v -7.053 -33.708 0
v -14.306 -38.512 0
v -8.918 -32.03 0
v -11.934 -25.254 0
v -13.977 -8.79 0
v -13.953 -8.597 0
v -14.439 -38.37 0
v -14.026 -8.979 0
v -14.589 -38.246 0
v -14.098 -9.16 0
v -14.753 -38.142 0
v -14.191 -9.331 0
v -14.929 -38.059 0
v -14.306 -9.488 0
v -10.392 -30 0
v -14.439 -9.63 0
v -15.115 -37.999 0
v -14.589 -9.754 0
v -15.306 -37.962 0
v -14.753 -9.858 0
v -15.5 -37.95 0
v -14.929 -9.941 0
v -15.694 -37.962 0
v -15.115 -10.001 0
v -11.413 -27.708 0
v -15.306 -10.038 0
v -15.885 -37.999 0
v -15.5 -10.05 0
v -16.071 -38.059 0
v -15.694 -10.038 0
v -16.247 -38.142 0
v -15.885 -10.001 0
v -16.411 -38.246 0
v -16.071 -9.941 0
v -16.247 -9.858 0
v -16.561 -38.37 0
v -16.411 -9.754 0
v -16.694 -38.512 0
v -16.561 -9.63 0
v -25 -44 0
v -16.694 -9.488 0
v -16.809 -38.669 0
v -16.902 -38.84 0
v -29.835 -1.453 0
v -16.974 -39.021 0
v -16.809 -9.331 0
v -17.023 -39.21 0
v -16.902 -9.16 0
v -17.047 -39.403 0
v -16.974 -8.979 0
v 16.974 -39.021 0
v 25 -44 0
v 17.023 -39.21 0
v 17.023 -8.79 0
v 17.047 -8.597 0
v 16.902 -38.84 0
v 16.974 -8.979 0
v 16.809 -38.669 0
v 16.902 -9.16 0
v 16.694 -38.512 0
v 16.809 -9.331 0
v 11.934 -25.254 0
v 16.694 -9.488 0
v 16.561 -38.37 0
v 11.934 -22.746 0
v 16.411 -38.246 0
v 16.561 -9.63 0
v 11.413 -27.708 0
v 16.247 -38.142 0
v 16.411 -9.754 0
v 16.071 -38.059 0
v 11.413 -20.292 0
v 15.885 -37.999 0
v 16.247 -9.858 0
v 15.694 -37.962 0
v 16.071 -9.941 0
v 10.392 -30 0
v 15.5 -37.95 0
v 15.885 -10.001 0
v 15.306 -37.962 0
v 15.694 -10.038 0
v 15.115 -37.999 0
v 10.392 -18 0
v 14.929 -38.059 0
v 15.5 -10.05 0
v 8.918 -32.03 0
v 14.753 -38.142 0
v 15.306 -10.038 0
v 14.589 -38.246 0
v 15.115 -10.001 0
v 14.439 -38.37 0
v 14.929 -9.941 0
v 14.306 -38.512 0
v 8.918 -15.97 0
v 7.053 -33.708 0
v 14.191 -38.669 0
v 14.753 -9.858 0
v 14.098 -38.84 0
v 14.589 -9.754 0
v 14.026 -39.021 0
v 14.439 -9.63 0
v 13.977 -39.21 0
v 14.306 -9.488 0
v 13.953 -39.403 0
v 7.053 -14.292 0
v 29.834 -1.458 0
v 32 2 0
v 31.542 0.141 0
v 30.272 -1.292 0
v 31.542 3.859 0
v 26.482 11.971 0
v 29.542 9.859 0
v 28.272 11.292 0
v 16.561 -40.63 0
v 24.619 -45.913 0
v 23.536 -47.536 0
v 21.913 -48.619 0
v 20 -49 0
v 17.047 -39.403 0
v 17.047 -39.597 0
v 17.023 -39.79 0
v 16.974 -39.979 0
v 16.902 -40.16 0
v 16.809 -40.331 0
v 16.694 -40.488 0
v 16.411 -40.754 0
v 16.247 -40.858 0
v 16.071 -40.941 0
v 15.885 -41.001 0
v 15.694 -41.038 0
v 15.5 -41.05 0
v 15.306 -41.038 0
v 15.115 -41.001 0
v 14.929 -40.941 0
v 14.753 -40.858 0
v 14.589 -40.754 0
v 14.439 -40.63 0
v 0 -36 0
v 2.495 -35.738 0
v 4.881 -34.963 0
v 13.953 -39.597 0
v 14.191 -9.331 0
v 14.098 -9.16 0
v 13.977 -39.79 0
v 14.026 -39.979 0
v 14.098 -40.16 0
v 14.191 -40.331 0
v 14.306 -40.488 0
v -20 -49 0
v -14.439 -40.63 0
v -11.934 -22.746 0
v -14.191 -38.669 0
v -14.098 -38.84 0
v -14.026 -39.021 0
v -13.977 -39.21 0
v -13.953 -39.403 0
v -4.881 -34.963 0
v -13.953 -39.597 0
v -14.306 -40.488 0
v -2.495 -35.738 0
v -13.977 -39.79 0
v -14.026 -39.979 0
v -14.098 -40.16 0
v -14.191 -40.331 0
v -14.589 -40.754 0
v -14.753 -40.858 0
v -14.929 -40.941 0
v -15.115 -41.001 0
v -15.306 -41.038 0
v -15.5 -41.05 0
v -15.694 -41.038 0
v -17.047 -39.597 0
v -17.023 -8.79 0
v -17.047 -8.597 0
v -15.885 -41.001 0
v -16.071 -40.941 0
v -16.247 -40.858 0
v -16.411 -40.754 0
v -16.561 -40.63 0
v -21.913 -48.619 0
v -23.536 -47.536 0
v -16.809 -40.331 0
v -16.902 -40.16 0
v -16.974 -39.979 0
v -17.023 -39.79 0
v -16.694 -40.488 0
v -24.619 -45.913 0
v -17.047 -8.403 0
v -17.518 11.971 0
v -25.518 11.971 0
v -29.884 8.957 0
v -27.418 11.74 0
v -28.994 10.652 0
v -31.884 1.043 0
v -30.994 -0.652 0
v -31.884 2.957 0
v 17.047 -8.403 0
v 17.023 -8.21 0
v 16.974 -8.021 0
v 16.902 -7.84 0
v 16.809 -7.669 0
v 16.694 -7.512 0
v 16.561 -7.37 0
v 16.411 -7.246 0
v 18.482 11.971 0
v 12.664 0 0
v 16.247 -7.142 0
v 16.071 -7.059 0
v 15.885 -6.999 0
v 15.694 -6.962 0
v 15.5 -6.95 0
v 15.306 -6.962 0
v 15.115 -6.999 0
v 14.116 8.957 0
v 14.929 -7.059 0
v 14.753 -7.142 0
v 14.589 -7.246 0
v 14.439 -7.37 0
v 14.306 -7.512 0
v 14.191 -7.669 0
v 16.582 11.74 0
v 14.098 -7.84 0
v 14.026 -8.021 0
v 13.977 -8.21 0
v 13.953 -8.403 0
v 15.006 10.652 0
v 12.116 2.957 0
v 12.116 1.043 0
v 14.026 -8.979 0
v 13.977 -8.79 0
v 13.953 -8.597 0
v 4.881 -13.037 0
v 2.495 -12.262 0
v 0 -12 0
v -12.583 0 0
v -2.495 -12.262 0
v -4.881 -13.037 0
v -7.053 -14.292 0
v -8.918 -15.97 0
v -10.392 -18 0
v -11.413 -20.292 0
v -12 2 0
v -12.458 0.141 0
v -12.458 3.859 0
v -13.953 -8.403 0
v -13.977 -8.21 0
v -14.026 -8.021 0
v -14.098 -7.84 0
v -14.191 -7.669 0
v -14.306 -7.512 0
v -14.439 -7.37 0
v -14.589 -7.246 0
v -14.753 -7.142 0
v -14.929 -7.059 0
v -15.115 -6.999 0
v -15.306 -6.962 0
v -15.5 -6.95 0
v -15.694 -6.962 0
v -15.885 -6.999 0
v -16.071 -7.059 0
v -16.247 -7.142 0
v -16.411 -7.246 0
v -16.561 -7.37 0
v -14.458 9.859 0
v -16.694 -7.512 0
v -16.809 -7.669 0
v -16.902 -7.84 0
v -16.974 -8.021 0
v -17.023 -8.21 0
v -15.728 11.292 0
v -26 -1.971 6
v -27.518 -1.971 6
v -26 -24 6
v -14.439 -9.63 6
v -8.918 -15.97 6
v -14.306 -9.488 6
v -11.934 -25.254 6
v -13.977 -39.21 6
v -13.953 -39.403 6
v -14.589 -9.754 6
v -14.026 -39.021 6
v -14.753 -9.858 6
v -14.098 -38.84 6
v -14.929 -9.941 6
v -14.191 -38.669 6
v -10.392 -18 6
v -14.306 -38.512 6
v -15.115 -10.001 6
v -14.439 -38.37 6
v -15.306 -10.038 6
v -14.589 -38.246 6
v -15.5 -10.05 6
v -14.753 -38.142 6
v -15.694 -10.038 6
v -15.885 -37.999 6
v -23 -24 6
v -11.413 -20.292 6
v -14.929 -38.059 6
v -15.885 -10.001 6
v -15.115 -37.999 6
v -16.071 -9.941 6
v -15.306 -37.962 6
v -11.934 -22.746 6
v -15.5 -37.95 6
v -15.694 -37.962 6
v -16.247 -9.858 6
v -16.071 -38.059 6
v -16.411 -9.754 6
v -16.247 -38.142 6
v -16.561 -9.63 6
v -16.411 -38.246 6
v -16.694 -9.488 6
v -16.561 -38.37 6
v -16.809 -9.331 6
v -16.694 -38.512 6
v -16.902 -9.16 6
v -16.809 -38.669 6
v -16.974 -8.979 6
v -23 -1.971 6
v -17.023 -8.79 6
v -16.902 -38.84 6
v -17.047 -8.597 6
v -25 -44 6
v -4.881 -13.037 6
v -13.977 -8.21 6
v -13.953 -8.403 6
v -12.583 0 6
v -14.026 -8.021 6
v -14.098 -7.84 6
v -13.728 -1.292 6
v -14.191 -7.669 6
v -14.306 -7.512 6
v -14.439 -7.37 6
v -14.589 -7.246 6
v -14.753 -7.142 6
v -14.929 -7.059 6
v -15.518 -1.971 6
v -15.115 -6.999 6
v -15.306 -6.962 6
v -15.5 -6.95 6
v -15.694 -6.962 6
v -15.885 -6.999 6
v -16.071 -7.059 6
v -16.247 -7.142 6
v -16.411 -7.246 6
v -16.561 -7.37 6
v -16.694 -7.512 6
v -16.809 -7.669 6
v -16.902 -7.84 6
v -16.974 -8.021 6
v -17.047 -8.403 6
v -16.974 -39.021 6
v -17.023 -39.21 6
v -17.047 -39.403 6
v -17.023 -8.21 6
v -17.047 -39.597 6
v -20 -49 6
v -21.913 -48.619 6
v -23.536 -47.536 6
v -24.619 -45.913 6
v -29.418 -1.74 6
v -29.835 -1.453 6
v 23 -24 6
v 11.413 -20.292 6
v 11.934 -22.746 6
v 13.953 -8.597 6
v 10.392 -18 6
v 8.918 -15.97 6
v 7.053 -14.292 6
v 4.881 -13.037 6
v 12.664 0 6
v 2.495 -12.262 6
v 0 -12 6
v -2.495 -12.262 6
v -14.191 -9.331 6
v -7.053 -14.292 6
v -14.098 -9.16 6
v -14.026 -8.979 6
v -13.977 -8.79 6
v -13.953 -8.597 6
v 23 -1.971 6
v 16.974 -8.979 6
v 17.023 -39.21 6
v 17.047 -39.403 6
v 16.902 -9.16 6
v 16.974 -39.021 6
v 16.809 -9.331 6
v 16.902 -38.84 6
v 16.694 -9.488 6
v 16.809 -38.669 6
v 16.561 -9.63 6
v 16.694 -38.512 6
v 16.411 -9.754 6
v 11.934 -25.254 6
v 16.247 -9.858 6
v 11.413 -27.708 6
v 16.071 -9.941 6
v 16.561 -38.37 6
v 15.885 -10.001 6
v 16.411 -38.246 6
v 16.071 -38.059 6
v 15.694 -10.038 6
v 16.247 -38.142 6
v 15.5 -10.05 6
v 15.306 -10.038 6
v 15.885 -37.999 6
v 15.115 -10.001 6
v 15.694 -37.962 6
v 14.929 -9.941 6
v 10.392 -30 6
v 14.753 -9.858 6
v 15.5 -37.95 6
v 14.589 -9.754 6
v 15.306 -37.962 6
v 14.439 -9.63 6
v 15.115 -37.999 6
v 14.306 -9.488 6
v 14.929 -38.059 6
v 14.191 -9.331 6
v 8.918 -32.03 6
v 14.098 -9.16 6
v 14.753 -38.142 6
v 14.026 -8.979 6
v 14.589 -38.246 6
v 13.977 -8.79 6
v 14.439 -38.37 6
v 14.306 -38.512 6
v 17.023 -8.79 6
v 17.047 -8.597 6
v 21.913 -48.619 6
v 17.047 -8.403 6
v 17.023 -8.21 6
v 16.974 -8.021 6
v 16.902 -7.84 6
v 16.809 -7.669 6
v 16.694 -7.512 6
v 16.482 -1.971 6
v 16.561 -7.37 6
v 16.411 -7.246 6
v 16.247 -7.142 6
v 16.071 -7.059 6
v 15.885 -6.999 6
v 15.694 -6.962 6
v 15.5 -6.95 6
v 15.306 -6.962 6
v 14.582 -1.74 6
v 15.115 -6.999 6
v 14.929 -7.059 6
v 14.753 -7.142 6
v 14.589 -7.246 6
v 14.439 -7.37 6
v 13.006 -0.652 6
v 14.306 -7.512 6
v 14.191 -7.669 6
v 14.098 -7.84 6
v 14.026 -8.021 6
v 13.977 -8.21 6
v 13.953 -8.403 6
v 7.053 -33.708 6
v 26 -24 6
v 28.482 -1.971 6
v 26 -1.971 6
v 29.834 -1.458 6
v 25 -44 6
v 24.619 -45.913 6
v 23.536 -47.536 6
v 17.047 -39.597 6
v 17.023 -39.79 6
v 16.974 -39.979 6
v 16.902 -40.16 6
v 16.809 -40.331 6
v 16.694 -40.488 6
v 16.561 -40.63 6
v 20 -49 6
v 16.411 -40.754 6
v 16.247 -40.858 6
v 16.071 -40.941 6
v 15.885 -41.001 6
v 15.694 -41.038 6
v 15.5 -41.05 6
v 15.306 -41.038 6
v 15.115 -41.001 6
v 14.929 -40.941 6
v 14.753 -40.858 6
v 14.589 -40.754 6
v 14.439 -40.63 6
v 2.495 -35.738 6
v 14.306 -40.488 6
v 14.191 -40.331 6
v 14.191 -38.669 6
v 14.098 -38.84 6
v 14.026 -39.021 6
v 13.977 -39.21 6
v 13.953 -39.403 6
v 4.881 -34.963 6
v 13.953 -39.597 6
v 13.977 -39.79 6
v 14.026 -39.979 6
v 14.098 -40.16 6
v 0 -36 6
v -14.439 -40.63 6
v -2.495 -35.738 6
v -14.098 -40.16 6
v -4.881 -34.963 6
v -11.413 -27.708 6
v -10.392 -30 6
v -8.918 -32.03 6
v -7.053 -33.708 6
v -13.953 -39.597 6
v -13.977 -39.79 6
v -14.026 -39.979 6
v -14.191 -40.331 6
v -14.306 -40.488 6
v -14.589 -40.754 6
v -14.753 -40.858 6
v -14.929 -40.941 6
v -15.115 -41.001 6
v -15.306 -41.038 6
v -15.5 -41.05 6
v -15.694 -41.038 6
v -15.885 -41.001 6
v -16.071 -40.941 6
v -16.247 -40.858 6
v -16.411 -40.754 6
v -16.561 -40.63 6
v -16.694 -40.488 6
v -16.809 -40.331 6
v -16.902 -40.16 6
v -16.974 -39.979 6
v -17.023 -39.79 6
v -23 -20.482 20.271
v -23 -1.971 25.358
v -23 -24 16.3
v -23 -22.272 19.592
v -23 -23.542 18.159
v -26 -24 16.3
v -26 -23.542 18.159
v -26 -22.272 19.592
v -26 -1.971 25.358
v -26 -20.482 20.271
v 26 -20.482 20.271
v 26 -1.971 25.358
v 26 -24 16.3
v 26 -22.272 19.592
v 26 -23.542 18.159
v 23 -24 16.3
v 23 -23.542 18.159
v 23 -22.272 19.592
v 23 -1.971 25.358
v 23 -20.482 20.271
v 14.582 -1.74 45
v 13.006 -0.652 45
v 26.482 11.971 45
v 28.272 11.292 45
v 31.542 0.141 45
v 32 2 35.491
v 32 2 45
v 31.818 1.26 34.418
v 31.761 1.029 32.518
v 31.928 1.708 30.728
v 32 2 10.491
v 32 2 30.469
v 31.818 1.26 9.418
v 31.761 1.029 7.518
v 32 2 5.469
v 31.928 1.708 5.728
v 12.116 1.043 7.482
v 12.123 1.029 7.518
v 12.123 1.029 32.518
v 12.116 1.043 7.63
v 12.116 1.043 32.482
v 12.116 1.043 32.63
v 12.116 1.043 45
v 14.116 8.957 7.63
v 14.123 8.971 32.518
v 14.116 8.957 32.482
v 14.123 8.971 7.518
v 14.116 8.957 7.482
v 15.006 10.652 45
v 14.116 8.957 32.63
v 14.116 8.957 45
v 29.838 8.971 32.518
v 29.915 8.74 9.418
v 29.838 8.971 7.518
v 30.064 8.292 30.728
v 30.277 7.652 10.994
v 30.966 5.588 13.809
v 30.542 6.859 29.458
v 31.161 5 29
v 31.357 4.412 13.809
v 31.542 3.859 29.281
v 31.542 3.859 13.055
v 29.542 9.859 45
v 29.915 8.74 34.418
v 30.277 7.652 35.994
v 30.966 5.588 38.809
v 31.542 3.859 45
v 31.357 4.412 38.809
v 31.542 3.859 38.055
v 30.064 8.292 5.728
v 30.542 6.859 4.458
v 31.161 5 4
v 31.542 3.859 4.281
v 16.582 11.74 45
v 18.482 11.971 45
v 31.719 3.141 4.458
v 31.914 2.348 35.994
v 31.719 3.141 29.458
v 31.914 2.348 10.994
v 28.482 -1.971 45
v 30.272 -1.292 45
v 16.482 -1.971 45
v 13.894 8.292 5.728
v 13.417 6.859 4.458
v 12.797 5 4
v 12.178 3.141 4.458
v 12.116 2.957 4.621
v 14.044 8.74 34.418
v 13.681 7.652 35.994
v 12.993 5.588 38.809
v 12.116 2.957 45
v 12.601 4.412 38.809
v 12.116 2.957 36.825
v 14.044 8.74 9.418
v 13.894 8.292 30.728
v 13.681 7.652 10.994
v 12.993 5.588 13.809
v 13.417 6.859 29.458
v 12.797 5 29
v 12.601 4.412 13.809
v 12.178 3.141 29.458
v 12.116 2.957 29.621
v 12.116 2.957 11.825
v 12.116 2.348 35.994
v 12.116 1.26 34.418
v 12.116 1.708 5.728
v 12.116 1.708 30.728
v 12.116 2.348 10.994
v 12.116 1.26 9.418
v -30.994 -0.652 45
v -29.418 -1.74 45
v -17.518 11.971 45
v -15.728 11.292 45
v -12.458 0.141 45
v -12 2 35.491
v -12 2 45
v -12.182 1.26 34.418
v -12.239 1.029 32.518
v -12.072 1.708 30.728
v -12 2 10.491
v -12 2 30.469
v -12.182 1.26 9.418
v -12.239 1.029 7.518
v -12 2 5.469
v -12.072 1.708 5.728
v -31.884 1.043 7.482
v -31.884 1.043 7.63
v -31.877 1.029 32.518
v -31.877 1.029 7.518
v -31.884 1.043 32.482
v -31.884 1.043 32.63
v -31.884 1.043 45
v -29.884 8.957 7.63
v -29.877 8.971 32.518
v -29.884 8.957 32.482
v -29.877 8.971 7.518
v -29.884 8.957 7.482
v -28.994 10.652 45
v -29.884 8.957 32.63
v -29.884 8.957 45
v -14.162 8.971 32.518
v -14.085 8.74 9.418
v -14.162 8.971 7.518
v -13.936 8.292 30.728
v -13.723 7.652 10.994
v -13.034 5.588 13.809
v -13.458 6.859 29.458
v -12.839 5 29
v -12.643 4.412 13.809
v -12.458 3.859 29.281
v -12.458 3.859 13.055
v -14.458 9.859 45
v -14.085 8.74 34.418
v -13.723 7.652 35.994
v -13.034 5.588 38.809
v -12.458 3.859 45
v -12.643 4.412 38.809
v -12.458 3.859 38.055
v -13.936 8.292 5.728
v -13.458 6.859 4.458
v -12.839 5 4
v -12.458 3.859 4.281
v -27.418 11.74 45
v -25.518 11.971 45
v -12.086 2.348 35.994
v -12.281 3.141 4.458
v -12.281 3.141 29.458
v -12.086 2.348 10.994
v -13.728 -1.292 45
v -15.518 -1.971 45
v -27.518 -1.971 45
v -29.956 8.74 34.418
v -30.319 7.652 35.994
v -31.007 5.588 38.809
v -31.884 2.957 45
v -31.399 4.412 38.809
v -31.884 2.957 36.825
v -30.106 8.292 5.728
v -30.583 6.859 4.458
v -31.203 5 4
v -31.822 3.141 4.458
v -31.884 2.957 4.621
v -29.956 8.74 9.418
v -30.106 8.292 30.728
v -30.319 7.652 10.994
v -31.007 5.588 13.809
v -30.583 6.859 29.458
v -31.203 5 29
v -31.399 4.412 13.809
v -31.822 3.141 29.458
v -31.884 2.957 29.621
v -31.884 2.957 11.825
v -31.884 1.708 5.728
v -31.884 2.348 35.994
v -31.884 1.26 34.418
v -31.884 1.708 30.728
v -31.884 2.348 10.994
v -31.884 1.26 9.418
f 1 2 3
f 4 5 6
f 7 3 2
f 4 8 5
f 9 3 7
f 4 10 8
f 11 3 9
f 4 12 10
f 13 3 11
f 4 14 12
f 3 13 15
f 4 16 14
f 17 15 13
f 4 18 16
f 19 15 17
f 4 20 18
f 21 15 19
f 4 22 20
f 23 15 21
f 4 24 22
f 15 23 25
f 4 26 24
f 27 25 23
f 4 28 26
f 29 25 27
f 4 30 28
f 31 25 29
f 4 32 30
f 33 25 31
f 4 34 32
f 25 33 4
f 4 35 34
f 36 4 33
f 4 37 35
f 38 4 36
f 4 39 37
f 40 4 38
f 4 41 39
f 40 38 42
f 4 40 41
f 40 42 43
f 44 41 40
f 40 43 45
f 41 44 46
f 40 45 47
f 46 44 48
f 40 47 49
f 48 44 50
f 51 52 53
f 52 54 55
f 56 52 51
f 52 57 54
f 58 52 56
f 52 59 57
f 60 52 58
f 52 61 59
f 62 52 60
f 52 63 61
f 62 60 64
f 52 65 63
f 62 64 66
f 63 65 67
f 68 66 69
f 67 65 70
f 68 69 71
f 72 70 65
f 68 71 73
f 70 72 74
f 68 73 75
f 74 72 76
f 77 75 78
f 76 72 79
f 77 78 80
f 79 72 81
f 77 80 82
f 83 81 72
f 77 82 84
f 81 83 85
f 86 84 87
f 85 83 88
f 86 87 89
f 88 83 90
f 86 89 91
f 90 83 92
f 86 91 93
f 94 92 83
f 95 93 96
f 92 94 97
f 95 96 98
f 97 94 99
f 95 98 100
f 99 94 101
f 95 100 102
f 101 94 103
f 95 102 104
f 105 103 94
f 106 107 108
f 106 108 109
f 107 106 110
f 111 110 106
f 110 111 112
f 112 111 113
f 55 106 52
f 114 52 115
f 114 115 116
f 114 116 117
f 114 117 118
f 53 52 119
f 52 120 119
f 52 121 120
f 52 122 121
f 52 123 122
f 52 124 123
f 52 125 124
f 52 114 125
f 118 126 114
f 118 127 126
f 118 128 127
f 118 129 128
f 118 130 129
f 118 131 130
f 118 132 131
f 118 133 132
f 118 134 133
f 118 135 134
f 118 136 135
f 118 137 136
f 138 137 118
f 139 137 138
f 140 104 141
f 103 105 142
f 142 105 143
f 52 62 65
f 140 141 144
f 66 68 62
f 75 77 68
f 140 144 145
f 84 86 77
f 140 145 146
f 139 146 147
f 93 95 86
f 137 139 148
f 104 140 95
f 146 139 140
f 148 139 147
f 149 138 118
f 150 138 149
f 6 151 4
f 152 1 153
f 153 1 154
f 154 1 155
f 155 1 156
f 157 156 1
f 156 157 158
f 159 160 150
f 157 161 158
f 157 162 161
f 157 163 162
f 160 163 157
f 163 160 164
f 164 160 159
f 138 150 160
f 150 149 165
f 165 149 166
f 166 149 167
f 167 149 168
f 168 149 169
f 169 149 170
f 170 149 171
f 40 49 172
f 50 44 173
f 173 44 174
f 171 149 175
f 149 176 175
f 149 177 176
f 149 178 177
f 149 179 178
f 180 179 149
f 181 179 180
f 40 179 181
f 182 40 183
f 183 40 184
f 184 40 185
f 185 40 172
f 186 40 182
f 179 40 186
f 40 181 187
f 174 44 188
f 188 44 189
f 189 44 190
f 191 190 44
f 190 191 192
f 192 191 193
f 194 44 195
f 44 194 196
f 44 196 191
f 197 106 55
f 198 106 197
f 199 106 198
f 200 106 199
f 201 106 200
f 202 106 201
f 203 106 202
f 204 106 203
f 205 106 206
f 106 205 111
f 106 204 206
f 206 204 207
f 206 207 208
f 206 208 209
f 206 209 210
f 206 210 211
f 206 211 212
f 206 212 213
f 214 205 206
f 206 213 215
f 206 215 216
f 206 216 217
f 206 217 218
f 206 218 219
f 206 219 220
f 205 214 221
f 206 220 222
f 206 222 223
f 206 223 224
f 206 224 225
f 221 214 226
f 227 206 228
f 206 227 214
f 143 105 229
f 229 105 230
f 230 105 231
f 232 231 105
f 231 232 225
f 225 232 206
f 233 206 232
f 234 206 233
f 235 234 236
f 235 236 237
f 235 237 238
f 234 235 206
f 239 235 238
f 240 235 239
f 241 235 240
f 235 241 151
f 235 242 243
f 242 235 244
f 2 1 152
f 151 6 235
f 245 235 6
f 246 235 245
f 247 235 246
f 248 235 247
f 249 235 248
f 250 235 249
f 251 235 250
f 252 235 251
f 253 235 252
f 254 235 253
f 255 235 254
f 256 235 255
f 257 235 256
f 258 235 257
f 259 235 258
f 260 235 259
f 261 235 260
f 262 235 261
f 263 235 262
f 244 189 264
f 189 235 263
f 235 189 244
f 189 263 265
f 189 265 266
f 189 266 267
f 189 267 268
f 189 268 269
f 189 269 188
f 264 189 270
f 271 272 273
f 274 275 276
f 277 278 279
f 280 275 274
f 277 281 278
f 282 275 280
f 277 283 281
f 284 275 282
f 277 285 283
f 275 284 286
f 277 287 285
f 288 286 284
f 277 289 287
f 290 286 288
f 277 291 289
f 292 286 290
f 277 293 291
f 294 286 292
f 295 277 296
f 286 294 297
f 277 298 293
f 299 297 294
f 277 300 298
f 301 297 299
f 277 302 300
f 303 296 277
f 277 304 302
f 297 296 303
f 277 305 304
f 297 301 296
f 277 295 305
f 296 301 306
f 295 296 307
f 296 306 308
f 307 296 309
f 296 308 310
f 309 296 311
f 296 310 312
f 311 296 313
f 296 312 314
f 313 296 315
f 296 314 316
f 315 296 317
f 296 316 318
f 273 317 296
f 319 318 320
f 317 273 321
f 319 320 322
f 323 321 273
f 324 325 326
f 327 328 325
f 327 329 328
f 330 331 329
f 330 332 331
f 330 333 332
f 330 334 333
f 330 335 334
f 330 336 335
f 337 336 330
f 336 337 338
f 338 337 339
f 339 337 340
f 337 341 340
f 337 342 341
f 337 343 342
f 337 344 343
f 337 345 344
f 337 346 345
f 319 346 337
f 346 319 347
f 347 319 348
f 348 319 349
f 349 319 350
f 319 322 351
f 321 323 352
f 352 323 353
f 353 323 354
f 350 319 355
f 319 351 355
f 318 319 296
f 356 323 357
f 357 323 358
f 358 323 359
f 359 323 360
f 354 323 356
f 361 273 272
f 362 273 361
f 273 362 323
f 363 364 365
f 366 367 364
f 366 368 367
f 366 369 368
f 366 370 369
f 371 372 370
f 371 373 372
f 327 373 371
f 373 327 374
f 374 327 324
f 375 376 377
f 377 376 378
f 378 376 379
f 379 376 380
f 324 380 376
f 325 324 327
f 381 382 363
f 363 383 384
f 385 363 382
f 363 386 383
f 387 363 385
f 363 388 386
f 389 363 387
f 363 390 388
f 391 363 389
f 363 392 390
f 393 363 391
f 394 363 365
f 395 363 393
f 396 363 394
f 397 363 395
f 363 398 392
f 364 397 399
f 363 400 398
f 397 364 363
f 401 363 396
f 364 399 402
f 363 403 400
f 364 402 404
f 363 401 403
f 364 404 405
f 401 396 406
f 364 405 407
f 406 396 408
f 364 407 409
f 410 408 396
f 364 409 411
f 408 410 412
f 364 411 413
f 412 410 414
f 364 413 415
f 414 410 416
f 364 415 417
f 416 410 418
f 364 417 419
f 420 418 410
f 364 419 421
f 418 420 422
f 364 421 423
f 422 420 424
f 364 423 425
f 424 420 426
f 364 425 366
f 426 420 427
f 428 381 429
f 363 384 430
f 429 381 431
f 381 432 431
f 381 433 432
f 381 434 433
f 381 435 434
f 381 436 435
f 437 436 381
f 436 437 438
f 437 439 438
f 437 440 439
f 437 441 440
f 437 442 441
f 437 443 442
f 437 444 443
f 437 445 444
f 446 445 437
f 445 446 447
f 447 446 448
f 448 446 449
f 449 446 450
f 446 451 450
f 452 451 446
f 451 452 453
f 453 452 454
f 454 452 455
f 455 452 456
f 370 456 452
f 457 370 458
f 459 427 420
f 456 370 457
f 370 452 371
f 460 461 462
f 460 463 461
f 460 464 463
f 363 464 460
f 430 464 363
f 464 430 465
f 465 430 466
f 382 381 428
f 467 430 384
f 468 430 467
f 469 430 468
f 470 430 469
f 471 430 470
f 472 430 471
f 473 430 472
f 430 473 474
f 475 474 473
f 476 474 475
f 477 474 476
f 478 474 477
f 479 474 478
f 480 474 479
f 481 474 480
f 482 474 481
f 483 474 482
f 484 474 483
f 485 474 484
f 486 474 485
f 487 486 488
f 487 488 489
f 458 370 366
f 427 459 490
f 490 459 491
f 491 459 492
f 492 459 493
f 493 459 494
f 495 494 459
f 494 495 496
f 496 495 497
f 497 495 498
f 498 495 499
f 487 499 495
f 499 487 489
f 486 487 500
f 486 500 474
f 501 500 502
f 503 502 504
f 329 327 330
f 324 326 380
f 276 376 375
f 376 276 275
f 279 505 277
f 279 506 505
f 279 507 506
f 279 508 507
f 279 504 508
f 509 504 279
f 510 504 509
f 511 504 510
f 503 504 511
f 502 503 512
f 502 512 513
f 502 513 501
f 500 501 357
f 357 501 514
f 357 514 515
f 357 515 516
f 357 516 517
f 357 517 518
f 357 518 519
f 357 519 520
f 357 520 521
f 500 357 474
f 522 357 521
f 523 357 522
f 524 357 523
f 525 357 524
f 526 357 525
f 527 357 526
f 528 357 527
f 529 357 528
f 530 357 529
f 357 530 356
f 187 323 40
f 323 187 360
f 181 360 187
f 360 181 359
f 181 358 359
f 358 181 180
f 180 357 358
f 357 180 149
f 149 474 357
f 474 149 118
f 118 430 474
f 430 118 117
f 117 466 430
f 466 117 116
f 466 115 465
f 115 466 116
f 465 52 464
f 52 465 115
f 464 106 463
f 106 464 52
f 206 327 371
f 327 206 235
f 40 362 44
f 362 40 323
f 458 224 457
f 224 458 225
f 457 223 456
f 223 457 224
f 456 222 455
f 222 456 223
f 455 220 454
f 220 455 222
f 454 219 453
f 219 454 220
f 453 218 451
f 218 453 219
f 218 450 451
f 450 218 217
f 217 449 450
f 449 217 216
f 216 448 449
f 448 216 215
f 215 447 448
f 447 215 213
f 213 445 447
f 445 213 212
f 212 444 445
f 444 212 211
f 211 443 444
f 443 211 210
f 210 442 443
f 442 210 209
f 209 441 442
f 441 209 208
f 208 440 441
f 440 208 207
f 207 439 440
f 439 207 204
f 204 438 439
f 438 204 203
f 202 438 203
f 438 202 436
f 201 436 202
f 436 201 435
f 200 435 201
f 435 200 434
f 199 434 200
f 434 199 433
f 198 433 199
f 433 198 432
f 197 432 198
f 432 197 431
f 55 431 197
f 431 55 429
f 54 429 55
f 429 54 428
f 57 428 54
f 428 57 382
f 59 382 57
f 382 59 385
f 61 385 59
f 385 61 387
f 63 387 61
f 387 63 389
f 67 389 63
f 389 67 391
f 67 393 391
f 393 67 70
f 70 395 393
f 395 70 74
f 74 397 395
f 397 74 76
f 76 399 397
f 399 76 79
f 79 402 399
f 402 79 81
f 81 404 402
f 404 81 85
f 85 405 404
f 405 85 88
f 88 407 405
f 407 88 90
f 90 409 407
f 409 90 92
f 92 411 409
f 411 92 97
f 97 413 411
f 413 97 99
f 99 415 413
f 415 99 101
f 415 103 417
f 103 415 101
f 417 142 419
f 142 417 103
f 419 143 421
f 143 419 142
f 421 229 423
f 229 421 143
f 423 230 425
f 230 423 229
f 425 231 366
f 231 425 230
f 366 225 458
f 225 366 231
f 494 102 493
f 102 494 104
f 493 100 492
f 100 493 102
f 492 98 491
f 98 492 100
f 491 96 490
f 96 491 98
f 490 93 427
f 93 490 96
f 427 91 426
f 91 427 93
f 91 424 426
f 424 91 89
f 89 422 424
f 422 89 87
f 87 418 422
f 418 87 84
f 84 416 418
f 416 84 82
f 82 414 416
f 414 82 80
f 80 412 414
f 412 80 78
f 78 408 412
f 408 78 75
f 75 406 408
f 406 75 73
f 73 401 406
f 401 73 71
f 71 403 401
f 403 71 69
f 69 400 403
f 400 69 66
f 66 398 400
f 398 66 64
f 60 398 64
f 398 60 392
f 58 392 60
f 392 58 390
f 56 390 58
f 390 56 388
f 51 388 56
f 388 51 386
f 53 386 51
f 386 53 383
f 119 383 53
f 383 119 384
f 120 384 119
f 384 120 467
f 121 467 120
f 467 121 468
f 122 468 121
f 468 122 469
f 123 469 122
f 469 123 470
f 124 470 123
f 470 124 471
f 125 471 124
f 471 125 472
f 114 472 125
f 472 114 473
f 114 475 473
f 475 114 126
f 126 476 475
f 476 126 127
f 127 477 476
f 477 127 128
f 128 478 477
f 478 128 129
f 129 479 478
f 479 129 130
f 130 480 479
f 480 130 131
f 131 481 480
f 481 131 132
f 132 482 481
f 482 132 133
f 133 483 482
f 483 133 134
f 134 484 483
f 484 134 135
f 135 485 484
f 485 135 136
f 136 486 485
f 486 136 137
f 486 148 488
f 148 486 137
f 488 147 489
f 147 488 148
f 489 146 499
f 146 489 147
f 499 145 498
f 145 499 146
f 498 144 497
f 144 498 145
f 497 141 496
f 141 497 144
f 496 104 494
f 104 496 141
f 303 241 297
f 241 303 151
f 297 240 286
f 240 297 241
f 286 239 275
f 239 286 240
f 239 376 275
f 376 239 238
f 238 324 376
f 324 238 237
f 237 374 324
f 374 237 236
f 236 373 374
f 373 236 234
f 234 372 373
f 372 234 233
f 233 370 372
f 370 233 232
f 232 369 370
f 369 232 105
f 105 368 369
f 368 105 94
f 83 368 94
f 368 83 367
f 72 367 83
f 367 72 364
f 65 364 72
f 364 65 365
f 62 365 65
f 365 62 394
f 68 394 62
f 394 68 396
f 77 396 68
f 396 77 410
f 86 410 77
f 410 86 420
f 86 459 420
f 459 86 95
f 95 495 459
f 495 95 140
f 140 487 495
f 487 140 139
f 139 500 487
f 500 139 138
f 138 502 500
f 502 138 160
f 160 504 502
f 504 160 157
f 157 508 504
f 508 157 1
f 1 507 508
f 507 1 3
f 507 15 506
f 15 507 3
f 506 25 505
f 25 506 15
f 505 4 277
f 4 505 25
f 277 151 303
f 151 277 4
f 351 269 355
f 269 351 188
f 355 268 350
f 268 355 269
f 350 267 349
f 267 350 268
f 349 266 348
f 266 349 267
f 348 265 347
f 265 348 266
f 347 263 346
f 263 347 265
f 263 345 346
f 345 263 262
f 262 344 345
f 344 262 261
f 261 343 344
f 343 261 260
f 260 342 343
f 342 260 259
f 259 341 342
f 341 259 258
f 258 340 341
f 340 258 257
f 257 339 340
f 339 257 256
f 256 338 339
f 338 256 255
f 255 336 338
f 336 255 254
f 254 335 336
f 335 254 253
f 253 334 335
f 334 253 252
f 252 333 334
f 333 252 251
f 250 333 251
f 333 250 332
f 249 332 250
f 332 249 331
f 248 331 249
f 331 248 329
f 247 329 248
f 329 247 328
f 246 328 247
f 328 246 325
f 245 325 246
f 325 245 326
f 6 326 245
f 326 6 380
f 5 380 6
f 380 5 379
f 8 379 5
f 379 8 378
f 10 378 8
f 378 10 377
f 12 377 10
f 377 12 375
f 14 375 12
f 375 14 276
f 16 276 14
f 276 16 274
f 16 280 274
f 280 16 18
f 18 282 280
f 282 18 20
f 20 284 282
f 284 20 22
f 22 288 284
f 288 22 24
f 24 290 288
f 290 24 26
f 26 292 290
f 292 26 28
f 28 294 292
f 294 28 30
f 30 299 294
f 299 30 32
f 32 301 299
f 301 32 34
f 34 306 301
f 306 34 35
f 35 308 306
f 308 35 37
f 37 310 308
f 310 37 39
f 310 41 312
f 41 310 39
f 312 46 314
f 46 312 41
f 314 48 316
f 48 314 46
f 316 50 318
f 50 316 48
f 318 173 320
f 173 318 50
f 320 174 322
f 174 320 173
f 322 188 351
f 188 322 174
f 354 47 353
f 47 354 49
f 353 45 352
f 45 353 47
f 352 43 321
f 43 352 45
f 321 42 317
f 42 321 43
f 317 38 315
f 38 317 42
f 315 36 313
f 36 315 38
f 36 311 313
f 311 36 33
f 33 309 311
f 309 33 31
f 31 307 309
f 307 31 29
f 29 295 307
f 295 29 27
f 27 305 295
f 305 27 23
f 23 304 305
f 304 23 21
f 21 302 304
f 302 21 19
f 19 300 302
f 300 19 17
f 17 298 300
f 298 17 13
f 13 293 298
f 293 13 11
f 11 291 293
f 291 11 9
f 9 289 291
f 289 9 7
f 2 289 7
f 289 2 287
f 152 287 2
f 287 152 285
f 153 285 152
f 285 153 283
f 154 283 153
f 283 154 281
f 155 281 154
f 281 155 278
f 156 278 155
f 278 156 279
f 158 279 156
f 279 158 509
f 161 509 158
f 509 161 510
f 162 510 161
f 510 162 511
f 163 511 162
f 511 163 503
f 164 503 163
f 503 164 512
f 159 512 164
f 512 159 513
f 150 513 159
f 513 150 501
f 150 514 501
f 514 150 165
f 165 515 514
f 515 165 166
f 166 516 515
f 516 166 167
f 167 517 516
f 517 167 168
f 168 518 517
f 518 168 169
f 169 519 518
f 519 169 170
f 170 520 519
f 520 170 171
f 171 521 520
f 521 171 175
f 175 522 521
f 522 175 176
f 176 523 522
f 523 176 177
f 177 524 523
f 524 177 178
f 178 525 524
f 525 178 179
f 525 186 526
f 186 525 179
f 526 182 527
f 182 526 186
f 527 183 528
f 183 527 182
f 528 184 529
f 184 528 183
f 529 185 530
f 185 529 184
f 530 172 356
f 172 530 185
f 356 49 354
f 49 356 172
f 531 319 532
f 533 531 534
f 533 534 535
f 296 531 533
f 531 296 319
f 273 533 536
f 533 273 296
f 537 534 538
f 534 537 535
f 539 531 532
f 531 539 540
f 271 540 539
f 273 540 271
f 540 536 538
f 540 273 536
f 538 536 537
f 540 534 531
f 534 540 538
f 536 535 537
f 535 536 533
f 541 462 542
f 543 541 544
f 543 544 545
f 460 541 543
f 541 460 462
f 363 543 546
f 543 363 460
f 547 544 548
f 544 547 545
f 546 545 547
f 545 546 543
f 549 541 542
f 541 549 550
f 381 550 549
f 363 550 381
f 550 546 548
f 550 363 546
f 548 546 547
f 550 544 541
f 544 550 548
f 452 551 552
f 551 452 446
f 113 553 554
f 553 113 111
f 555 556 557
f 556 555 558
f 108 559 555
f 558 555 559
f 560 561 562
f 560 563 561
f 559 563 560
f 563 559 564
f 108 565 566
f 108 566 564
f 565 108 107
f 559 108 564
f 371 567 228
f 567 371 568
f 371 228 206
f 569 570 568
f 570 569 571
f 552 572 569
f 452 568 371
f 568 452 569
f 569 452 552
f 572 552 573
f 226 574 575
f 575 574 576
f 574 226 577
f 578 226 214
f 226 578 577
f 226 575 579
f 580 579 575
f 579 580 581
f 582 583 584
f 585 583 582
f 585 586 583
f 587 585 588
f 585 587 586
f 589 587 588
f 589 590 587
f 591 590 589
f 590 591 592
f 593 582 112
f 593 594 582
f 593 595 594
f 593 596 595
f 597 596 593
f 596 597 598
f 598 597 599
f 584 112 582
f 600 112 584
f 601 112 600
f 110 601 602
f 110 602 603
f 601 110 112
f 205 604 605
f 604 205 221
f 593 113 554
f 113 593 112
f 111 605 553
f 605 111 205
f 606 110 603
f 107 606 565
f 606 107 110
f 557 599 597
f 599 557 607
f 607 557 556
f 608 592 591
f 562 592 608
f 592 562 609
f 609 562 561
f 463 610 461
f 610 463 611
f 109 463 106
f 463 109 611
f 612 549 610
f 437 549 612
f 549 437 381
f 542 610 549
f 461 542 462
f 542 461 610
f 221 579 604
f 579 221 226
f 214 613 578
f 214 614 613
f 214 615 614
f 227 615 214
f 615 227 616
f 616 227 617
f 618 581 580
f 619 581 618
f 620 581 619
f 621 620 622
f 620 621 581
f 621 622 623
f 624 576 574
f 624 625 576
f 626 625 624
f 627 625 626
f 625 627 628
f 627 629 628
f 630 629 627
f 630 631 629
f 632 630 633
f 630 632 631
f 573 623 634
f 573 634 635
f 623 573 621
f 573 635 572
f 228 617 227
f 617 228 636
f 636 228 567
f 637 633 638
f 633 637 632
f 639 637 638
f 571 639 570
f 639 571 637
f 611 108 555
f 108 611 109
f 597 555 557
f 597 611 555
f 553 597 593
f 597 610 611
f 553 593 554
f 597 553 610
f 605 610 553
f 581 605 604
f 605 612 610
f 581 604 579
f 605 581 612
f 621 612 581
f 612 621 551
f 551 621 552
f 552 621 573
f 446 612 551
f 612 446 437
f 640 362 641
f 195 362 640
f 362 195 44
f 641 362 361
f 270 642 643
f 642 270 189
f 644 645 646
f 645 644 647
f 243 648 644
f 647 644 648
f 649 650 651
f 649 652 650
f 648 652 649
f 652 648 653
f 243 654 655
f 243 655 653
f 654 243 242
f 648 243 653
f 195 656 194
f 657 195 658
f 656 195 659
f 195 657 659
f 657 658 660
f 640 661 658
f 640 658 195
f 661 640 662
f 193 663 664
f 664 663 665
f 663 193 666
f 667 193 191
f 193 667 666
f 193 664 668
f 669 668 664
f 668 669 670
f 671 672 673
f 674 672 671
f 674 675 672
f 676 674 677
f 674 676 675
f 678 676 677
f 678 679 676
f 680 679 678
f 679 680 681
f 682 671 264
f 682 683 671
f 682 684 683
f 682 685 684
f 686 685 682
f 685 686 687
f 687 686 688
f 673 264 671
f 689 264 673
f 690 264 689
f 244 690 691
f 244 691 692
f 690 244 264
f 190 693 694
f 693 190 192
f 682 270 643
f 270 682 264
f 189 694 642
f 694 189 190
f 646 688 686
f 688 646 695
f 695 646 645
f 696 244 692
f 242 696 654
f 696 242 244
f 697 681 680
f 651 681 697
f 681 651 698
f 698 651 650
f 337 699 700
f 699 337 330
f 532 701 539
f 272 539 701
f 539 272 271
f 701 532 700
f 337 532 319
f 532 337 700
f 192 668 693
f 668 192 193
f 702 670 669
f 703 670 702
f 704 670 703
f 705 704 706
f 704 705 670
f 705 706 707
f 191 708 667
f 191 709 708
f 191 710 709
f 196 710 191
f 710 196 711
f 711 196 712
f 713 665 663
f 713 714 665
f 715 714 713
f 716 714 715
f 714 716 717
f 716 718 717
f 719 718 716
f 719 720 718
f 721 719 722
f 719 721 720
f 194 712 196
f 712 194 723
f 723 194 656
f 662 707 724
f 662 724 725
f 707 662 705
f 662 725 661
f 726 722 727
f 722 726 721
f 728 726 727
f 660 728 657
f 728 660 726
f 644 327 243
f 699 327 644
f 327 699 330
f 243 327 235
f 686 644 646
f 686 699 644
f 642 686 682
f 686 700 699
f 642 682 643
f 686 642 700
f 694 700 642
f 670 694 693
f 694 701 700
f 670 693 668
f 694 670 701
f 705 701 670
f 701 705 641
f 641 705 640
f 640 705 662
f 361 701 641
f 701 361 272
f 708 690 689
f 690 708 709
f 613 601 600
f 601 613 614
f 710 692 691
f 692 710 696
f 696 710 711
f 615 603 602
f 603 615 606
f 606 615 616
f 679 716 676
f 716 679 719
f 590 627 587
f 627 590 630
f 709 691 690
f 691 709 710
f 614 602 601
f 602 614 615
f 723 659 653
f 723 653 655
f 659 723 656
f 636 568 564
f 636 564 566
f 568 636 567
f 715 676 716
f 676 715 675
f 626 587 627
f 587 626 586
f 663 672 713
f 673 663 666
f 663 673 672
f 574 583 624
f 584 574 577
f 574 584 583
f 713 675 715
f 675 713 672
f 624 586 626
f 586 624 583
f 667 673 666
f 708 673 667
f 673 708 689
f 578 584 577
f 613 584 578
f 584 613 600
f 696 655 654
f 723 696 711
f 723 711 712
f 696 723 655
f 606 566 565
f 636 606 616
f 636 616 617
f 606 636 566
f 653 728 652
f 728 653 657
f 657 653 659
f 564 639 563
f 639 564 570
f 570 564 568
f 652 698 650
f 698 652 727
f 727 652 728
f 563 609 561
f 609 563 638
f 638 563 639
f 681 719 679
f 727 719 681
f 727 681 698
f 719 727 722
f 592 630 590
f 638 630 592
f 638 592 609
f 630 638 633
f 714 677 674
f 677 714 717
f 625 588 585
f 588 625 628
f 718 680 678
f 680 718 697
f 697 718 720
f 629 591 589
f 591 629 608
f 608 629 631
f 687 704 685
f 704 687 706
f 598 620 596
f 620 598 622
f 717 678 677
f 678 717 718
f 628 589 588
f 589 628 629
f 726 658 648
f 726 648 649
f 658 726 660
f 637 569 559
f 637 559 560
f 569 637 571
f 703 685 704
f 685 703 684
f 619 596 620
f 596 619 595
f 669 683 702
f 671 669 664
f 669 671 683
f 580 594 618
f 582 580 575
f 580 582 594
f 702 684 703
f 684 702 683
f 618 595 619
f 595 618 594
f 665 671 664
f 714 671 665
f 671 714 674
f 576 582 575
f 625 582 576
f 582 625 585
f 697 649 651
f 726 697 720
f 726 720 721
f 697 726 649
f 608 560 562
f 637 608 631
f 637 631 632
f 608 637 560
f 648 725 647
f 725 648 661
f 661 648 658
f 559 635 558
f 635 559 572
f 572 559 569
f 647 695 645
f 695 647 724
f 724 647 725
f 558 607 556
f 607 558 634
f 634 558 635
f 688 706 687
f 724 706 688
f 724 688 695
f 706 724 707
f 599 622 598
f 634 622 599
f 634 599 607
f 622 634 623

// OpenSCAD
// file: configuration.scad
rod_radius = 6.0;
frame_rod_radius = 4.0;
z_threaded_rod_radius = 4.0;

y_rod_height = 70;
x_rod_spacing = 70;

bearing_radius = 11; 					// 608 bearing

//  LM8 = 7.5  LM10 = 9.5  LM12 = 10.5
linear_bearing_radius =  7.6;  // LM8 + some extra space

z_threaded_to_smooth_spacing = 30;   // 30mm is OK for 8mm rods 
x_end_threaded_rod_height = 20;
// file: y-end-motor-bracket.scad
//y_end_motor_bracket();

module y_end_motor_bracket(){

	bracket_thickness = 6;

	union(){
	
		linear_extrude(height=bracket_thickness)
			y_end_motor_bracket_2d();
	
		translate([0,-(23), 6 - 0.1])
			rotate([90,0,0])
				linear_extrude(height=bracket_thickness/2)
					y_end_motor_bracket_support_2d();
	
		translate([0, 26, 6 - 0.1])
			rotate([90,0,0])
				linear_extrude(height=bracket_thickness/2)
					y_end_motor_bracket_support_2d();
	}

}

module y_end_motor_bracket_support_2d(){

	support_thickness = 4;
	support_height = 20;

	hull(){
		polygon(points = [[0,0], [0,support_height], [support_height * 1.2,0]]);
		translate([support_height, support_height * 0.62 - 2]) 
			circle(r=4);
		}
}


module y_end_motor_bracket_2d(){

	bracket_depth = 49;
	motor_centre = 24;
	bracket_round_radius = 5;

	bracket_width = 60;
	bracket_small_width = 40;

	stepper_bolt_hole = 1.55;
	stepper_bolt_hole_offset = 31/2;

	difference(){
	
		hull(){	
			translate([bracket_depth - bracket_round_radius, bracket_small_width / 2]) 
				circle(r=bracket_round_radius);	
			translate([bracket_depth - bracket_round_radius, -bracket_small_width / 2])
				circle(r=bracket_round_radius);	
			polygon(points=[
				[0, bracket_width/2], 
				[bracket_depth, bracket_small_width/2 ],
				[bracket_depth, -bracket_small_width/2 ],
				[0, -bracket_width/2],
			]);
		}

		translate([motor_centre, 0])
				circle(r=12);	

		// holes for stepper bolts
		#translate([motor_centre - stepper_bolt_hole_offset, stepper_bolt_hole_offset])
			circle(r=stepper_bolt_hole, $fn=50);
		#translate([motor_centre + stepper_bolt_hole_offset, stepper_bolt_hole_offset])
			circle(r=stepper_bolt_hole, $fn=50);
		#translate([motor_centre - stepper_bolt_hole_offset, -stepper_bolt_hole_offset])
			circle(r=stepper_bolt_hole, $fn=50);
		#translate([motor_centre + stepper_bolt_hole_offset, -stepper_bolt_hole_offset])
			circle(r=stepper_bolt_hole, $fn=50);


	}
}
 
// file: common_components.scad
module rod_clamp_holes(){

	bolt_head_radius = 3.5;
	bolt_shaft_radius = 1.55;
	depth = 20; 
	nut_depth = 8.5; 
	nut_radius = 2.0; 

	cylinder(h=depth, r=bolt_shaft_radius, $fn=50);

	cylinder(h=4, r=bolt_head_radius);

	translate([-nut_depth, -5.7/2, nut_depth]) 
		cube([nut_depth + nut_radius +2 , 5.7, 3.2]);

}

//rod_clamp_holes();




module warp_prevention(){

	translate([-100,-100,0]){
		for(i = [0:20:200]){
	
			translate([i, 0, 0])
				cube([2, 200, 2]);
	
			translate([0, i, 0])
				cube([200, 2, 2]);
	
		}
	}

}

module teardrop_cylinder(r, h){

	linear_extrude(height=h){
		hull(){
	
			circle(r=r);
			translate([-r * 1.25, 0])
				circle(r=1);
	
		}
	}
}
// main file
	
include <common_components.scad>
include <y-end-motor-bracket.scad>
include <configuration.scad>

screw_radius = 1.75;

// testing
//y_end_2d();
//teardrop_cylinder(5, 50);
//rail_mount();
//bearing_mount_2d();


// parts
y_end_motor_mount(); 
//!y_end_bearing_mount(); 



module bearing_mount_2d(){


	difference(){
	
		hull(){
			
			translate([0, 0])
				circle(r=9);
	
			rotate([0,0,180])
				translate([10, 0])
					square([17, 17],  center=true);
	
	
		}

		circle(r=4);

	}

}

module y_end_bearing_mount(){



	difference(){ 
	
		union(){ 
			
			translate([0, -2, 0])
				rail_mount();
			translate([0, -12, 0])
				rotate([0,0,-90])	
					linear_extrude(height=15)
						bearing_mount_2d();

		}

	
		//translate([-35, -20, 26])
//			rotate([0,90,0])
//				#cylinder(r=16, h=70);
	

		// hex nut m8 = 15mm
		translate([0, -12, 8])
			#cylinder(r=7.5, h=10, $fn=6);
		

		translate([-35, 5, 8])
			rotate([0,90,0])
				#teardrop_cylinder(r=frame_rod_radius, h=70);
	
		translate([-35, 5, 33])
			rotate([0,90,0])
				#teardrop_cylinder(r=frame_rod_radius, h=70);


	}


}

module y_end_motor_mount(){



	difference(){ 
	
		union(){ 
			
			translate([22, -2, 0])
				rail_mount();
			translate([-22, -2, 0]) 
				rail_mount();
			translate([0, 0, 0])
				rotate([0,0,-90])	
					y_end_motor_bracket();

		}

	
		translate([-35, 5, 8])
			rotate([0,90,0])
				#teardrop_cylinder(r=frame_rod_radius, h=70);
	
		translate([-35, 5, 33])
			rotate([0,90,0])
				#teardrop_cylinder(r=frame_rod_radius, h=70);


	}


}



 
module rail_mount(){

	linear_extrude(height=45)
		rail_mount_2d();
		

}

module rail_mount_2d(){


	hull(){
		
		translate([4, 10])
			circle(r=4);

		translate([-4, 10])
			circle(r=4);

		translate([-6, 4])
			circle(r=4);

		translate([6, 4])
			circle(r=4);


	}

}
